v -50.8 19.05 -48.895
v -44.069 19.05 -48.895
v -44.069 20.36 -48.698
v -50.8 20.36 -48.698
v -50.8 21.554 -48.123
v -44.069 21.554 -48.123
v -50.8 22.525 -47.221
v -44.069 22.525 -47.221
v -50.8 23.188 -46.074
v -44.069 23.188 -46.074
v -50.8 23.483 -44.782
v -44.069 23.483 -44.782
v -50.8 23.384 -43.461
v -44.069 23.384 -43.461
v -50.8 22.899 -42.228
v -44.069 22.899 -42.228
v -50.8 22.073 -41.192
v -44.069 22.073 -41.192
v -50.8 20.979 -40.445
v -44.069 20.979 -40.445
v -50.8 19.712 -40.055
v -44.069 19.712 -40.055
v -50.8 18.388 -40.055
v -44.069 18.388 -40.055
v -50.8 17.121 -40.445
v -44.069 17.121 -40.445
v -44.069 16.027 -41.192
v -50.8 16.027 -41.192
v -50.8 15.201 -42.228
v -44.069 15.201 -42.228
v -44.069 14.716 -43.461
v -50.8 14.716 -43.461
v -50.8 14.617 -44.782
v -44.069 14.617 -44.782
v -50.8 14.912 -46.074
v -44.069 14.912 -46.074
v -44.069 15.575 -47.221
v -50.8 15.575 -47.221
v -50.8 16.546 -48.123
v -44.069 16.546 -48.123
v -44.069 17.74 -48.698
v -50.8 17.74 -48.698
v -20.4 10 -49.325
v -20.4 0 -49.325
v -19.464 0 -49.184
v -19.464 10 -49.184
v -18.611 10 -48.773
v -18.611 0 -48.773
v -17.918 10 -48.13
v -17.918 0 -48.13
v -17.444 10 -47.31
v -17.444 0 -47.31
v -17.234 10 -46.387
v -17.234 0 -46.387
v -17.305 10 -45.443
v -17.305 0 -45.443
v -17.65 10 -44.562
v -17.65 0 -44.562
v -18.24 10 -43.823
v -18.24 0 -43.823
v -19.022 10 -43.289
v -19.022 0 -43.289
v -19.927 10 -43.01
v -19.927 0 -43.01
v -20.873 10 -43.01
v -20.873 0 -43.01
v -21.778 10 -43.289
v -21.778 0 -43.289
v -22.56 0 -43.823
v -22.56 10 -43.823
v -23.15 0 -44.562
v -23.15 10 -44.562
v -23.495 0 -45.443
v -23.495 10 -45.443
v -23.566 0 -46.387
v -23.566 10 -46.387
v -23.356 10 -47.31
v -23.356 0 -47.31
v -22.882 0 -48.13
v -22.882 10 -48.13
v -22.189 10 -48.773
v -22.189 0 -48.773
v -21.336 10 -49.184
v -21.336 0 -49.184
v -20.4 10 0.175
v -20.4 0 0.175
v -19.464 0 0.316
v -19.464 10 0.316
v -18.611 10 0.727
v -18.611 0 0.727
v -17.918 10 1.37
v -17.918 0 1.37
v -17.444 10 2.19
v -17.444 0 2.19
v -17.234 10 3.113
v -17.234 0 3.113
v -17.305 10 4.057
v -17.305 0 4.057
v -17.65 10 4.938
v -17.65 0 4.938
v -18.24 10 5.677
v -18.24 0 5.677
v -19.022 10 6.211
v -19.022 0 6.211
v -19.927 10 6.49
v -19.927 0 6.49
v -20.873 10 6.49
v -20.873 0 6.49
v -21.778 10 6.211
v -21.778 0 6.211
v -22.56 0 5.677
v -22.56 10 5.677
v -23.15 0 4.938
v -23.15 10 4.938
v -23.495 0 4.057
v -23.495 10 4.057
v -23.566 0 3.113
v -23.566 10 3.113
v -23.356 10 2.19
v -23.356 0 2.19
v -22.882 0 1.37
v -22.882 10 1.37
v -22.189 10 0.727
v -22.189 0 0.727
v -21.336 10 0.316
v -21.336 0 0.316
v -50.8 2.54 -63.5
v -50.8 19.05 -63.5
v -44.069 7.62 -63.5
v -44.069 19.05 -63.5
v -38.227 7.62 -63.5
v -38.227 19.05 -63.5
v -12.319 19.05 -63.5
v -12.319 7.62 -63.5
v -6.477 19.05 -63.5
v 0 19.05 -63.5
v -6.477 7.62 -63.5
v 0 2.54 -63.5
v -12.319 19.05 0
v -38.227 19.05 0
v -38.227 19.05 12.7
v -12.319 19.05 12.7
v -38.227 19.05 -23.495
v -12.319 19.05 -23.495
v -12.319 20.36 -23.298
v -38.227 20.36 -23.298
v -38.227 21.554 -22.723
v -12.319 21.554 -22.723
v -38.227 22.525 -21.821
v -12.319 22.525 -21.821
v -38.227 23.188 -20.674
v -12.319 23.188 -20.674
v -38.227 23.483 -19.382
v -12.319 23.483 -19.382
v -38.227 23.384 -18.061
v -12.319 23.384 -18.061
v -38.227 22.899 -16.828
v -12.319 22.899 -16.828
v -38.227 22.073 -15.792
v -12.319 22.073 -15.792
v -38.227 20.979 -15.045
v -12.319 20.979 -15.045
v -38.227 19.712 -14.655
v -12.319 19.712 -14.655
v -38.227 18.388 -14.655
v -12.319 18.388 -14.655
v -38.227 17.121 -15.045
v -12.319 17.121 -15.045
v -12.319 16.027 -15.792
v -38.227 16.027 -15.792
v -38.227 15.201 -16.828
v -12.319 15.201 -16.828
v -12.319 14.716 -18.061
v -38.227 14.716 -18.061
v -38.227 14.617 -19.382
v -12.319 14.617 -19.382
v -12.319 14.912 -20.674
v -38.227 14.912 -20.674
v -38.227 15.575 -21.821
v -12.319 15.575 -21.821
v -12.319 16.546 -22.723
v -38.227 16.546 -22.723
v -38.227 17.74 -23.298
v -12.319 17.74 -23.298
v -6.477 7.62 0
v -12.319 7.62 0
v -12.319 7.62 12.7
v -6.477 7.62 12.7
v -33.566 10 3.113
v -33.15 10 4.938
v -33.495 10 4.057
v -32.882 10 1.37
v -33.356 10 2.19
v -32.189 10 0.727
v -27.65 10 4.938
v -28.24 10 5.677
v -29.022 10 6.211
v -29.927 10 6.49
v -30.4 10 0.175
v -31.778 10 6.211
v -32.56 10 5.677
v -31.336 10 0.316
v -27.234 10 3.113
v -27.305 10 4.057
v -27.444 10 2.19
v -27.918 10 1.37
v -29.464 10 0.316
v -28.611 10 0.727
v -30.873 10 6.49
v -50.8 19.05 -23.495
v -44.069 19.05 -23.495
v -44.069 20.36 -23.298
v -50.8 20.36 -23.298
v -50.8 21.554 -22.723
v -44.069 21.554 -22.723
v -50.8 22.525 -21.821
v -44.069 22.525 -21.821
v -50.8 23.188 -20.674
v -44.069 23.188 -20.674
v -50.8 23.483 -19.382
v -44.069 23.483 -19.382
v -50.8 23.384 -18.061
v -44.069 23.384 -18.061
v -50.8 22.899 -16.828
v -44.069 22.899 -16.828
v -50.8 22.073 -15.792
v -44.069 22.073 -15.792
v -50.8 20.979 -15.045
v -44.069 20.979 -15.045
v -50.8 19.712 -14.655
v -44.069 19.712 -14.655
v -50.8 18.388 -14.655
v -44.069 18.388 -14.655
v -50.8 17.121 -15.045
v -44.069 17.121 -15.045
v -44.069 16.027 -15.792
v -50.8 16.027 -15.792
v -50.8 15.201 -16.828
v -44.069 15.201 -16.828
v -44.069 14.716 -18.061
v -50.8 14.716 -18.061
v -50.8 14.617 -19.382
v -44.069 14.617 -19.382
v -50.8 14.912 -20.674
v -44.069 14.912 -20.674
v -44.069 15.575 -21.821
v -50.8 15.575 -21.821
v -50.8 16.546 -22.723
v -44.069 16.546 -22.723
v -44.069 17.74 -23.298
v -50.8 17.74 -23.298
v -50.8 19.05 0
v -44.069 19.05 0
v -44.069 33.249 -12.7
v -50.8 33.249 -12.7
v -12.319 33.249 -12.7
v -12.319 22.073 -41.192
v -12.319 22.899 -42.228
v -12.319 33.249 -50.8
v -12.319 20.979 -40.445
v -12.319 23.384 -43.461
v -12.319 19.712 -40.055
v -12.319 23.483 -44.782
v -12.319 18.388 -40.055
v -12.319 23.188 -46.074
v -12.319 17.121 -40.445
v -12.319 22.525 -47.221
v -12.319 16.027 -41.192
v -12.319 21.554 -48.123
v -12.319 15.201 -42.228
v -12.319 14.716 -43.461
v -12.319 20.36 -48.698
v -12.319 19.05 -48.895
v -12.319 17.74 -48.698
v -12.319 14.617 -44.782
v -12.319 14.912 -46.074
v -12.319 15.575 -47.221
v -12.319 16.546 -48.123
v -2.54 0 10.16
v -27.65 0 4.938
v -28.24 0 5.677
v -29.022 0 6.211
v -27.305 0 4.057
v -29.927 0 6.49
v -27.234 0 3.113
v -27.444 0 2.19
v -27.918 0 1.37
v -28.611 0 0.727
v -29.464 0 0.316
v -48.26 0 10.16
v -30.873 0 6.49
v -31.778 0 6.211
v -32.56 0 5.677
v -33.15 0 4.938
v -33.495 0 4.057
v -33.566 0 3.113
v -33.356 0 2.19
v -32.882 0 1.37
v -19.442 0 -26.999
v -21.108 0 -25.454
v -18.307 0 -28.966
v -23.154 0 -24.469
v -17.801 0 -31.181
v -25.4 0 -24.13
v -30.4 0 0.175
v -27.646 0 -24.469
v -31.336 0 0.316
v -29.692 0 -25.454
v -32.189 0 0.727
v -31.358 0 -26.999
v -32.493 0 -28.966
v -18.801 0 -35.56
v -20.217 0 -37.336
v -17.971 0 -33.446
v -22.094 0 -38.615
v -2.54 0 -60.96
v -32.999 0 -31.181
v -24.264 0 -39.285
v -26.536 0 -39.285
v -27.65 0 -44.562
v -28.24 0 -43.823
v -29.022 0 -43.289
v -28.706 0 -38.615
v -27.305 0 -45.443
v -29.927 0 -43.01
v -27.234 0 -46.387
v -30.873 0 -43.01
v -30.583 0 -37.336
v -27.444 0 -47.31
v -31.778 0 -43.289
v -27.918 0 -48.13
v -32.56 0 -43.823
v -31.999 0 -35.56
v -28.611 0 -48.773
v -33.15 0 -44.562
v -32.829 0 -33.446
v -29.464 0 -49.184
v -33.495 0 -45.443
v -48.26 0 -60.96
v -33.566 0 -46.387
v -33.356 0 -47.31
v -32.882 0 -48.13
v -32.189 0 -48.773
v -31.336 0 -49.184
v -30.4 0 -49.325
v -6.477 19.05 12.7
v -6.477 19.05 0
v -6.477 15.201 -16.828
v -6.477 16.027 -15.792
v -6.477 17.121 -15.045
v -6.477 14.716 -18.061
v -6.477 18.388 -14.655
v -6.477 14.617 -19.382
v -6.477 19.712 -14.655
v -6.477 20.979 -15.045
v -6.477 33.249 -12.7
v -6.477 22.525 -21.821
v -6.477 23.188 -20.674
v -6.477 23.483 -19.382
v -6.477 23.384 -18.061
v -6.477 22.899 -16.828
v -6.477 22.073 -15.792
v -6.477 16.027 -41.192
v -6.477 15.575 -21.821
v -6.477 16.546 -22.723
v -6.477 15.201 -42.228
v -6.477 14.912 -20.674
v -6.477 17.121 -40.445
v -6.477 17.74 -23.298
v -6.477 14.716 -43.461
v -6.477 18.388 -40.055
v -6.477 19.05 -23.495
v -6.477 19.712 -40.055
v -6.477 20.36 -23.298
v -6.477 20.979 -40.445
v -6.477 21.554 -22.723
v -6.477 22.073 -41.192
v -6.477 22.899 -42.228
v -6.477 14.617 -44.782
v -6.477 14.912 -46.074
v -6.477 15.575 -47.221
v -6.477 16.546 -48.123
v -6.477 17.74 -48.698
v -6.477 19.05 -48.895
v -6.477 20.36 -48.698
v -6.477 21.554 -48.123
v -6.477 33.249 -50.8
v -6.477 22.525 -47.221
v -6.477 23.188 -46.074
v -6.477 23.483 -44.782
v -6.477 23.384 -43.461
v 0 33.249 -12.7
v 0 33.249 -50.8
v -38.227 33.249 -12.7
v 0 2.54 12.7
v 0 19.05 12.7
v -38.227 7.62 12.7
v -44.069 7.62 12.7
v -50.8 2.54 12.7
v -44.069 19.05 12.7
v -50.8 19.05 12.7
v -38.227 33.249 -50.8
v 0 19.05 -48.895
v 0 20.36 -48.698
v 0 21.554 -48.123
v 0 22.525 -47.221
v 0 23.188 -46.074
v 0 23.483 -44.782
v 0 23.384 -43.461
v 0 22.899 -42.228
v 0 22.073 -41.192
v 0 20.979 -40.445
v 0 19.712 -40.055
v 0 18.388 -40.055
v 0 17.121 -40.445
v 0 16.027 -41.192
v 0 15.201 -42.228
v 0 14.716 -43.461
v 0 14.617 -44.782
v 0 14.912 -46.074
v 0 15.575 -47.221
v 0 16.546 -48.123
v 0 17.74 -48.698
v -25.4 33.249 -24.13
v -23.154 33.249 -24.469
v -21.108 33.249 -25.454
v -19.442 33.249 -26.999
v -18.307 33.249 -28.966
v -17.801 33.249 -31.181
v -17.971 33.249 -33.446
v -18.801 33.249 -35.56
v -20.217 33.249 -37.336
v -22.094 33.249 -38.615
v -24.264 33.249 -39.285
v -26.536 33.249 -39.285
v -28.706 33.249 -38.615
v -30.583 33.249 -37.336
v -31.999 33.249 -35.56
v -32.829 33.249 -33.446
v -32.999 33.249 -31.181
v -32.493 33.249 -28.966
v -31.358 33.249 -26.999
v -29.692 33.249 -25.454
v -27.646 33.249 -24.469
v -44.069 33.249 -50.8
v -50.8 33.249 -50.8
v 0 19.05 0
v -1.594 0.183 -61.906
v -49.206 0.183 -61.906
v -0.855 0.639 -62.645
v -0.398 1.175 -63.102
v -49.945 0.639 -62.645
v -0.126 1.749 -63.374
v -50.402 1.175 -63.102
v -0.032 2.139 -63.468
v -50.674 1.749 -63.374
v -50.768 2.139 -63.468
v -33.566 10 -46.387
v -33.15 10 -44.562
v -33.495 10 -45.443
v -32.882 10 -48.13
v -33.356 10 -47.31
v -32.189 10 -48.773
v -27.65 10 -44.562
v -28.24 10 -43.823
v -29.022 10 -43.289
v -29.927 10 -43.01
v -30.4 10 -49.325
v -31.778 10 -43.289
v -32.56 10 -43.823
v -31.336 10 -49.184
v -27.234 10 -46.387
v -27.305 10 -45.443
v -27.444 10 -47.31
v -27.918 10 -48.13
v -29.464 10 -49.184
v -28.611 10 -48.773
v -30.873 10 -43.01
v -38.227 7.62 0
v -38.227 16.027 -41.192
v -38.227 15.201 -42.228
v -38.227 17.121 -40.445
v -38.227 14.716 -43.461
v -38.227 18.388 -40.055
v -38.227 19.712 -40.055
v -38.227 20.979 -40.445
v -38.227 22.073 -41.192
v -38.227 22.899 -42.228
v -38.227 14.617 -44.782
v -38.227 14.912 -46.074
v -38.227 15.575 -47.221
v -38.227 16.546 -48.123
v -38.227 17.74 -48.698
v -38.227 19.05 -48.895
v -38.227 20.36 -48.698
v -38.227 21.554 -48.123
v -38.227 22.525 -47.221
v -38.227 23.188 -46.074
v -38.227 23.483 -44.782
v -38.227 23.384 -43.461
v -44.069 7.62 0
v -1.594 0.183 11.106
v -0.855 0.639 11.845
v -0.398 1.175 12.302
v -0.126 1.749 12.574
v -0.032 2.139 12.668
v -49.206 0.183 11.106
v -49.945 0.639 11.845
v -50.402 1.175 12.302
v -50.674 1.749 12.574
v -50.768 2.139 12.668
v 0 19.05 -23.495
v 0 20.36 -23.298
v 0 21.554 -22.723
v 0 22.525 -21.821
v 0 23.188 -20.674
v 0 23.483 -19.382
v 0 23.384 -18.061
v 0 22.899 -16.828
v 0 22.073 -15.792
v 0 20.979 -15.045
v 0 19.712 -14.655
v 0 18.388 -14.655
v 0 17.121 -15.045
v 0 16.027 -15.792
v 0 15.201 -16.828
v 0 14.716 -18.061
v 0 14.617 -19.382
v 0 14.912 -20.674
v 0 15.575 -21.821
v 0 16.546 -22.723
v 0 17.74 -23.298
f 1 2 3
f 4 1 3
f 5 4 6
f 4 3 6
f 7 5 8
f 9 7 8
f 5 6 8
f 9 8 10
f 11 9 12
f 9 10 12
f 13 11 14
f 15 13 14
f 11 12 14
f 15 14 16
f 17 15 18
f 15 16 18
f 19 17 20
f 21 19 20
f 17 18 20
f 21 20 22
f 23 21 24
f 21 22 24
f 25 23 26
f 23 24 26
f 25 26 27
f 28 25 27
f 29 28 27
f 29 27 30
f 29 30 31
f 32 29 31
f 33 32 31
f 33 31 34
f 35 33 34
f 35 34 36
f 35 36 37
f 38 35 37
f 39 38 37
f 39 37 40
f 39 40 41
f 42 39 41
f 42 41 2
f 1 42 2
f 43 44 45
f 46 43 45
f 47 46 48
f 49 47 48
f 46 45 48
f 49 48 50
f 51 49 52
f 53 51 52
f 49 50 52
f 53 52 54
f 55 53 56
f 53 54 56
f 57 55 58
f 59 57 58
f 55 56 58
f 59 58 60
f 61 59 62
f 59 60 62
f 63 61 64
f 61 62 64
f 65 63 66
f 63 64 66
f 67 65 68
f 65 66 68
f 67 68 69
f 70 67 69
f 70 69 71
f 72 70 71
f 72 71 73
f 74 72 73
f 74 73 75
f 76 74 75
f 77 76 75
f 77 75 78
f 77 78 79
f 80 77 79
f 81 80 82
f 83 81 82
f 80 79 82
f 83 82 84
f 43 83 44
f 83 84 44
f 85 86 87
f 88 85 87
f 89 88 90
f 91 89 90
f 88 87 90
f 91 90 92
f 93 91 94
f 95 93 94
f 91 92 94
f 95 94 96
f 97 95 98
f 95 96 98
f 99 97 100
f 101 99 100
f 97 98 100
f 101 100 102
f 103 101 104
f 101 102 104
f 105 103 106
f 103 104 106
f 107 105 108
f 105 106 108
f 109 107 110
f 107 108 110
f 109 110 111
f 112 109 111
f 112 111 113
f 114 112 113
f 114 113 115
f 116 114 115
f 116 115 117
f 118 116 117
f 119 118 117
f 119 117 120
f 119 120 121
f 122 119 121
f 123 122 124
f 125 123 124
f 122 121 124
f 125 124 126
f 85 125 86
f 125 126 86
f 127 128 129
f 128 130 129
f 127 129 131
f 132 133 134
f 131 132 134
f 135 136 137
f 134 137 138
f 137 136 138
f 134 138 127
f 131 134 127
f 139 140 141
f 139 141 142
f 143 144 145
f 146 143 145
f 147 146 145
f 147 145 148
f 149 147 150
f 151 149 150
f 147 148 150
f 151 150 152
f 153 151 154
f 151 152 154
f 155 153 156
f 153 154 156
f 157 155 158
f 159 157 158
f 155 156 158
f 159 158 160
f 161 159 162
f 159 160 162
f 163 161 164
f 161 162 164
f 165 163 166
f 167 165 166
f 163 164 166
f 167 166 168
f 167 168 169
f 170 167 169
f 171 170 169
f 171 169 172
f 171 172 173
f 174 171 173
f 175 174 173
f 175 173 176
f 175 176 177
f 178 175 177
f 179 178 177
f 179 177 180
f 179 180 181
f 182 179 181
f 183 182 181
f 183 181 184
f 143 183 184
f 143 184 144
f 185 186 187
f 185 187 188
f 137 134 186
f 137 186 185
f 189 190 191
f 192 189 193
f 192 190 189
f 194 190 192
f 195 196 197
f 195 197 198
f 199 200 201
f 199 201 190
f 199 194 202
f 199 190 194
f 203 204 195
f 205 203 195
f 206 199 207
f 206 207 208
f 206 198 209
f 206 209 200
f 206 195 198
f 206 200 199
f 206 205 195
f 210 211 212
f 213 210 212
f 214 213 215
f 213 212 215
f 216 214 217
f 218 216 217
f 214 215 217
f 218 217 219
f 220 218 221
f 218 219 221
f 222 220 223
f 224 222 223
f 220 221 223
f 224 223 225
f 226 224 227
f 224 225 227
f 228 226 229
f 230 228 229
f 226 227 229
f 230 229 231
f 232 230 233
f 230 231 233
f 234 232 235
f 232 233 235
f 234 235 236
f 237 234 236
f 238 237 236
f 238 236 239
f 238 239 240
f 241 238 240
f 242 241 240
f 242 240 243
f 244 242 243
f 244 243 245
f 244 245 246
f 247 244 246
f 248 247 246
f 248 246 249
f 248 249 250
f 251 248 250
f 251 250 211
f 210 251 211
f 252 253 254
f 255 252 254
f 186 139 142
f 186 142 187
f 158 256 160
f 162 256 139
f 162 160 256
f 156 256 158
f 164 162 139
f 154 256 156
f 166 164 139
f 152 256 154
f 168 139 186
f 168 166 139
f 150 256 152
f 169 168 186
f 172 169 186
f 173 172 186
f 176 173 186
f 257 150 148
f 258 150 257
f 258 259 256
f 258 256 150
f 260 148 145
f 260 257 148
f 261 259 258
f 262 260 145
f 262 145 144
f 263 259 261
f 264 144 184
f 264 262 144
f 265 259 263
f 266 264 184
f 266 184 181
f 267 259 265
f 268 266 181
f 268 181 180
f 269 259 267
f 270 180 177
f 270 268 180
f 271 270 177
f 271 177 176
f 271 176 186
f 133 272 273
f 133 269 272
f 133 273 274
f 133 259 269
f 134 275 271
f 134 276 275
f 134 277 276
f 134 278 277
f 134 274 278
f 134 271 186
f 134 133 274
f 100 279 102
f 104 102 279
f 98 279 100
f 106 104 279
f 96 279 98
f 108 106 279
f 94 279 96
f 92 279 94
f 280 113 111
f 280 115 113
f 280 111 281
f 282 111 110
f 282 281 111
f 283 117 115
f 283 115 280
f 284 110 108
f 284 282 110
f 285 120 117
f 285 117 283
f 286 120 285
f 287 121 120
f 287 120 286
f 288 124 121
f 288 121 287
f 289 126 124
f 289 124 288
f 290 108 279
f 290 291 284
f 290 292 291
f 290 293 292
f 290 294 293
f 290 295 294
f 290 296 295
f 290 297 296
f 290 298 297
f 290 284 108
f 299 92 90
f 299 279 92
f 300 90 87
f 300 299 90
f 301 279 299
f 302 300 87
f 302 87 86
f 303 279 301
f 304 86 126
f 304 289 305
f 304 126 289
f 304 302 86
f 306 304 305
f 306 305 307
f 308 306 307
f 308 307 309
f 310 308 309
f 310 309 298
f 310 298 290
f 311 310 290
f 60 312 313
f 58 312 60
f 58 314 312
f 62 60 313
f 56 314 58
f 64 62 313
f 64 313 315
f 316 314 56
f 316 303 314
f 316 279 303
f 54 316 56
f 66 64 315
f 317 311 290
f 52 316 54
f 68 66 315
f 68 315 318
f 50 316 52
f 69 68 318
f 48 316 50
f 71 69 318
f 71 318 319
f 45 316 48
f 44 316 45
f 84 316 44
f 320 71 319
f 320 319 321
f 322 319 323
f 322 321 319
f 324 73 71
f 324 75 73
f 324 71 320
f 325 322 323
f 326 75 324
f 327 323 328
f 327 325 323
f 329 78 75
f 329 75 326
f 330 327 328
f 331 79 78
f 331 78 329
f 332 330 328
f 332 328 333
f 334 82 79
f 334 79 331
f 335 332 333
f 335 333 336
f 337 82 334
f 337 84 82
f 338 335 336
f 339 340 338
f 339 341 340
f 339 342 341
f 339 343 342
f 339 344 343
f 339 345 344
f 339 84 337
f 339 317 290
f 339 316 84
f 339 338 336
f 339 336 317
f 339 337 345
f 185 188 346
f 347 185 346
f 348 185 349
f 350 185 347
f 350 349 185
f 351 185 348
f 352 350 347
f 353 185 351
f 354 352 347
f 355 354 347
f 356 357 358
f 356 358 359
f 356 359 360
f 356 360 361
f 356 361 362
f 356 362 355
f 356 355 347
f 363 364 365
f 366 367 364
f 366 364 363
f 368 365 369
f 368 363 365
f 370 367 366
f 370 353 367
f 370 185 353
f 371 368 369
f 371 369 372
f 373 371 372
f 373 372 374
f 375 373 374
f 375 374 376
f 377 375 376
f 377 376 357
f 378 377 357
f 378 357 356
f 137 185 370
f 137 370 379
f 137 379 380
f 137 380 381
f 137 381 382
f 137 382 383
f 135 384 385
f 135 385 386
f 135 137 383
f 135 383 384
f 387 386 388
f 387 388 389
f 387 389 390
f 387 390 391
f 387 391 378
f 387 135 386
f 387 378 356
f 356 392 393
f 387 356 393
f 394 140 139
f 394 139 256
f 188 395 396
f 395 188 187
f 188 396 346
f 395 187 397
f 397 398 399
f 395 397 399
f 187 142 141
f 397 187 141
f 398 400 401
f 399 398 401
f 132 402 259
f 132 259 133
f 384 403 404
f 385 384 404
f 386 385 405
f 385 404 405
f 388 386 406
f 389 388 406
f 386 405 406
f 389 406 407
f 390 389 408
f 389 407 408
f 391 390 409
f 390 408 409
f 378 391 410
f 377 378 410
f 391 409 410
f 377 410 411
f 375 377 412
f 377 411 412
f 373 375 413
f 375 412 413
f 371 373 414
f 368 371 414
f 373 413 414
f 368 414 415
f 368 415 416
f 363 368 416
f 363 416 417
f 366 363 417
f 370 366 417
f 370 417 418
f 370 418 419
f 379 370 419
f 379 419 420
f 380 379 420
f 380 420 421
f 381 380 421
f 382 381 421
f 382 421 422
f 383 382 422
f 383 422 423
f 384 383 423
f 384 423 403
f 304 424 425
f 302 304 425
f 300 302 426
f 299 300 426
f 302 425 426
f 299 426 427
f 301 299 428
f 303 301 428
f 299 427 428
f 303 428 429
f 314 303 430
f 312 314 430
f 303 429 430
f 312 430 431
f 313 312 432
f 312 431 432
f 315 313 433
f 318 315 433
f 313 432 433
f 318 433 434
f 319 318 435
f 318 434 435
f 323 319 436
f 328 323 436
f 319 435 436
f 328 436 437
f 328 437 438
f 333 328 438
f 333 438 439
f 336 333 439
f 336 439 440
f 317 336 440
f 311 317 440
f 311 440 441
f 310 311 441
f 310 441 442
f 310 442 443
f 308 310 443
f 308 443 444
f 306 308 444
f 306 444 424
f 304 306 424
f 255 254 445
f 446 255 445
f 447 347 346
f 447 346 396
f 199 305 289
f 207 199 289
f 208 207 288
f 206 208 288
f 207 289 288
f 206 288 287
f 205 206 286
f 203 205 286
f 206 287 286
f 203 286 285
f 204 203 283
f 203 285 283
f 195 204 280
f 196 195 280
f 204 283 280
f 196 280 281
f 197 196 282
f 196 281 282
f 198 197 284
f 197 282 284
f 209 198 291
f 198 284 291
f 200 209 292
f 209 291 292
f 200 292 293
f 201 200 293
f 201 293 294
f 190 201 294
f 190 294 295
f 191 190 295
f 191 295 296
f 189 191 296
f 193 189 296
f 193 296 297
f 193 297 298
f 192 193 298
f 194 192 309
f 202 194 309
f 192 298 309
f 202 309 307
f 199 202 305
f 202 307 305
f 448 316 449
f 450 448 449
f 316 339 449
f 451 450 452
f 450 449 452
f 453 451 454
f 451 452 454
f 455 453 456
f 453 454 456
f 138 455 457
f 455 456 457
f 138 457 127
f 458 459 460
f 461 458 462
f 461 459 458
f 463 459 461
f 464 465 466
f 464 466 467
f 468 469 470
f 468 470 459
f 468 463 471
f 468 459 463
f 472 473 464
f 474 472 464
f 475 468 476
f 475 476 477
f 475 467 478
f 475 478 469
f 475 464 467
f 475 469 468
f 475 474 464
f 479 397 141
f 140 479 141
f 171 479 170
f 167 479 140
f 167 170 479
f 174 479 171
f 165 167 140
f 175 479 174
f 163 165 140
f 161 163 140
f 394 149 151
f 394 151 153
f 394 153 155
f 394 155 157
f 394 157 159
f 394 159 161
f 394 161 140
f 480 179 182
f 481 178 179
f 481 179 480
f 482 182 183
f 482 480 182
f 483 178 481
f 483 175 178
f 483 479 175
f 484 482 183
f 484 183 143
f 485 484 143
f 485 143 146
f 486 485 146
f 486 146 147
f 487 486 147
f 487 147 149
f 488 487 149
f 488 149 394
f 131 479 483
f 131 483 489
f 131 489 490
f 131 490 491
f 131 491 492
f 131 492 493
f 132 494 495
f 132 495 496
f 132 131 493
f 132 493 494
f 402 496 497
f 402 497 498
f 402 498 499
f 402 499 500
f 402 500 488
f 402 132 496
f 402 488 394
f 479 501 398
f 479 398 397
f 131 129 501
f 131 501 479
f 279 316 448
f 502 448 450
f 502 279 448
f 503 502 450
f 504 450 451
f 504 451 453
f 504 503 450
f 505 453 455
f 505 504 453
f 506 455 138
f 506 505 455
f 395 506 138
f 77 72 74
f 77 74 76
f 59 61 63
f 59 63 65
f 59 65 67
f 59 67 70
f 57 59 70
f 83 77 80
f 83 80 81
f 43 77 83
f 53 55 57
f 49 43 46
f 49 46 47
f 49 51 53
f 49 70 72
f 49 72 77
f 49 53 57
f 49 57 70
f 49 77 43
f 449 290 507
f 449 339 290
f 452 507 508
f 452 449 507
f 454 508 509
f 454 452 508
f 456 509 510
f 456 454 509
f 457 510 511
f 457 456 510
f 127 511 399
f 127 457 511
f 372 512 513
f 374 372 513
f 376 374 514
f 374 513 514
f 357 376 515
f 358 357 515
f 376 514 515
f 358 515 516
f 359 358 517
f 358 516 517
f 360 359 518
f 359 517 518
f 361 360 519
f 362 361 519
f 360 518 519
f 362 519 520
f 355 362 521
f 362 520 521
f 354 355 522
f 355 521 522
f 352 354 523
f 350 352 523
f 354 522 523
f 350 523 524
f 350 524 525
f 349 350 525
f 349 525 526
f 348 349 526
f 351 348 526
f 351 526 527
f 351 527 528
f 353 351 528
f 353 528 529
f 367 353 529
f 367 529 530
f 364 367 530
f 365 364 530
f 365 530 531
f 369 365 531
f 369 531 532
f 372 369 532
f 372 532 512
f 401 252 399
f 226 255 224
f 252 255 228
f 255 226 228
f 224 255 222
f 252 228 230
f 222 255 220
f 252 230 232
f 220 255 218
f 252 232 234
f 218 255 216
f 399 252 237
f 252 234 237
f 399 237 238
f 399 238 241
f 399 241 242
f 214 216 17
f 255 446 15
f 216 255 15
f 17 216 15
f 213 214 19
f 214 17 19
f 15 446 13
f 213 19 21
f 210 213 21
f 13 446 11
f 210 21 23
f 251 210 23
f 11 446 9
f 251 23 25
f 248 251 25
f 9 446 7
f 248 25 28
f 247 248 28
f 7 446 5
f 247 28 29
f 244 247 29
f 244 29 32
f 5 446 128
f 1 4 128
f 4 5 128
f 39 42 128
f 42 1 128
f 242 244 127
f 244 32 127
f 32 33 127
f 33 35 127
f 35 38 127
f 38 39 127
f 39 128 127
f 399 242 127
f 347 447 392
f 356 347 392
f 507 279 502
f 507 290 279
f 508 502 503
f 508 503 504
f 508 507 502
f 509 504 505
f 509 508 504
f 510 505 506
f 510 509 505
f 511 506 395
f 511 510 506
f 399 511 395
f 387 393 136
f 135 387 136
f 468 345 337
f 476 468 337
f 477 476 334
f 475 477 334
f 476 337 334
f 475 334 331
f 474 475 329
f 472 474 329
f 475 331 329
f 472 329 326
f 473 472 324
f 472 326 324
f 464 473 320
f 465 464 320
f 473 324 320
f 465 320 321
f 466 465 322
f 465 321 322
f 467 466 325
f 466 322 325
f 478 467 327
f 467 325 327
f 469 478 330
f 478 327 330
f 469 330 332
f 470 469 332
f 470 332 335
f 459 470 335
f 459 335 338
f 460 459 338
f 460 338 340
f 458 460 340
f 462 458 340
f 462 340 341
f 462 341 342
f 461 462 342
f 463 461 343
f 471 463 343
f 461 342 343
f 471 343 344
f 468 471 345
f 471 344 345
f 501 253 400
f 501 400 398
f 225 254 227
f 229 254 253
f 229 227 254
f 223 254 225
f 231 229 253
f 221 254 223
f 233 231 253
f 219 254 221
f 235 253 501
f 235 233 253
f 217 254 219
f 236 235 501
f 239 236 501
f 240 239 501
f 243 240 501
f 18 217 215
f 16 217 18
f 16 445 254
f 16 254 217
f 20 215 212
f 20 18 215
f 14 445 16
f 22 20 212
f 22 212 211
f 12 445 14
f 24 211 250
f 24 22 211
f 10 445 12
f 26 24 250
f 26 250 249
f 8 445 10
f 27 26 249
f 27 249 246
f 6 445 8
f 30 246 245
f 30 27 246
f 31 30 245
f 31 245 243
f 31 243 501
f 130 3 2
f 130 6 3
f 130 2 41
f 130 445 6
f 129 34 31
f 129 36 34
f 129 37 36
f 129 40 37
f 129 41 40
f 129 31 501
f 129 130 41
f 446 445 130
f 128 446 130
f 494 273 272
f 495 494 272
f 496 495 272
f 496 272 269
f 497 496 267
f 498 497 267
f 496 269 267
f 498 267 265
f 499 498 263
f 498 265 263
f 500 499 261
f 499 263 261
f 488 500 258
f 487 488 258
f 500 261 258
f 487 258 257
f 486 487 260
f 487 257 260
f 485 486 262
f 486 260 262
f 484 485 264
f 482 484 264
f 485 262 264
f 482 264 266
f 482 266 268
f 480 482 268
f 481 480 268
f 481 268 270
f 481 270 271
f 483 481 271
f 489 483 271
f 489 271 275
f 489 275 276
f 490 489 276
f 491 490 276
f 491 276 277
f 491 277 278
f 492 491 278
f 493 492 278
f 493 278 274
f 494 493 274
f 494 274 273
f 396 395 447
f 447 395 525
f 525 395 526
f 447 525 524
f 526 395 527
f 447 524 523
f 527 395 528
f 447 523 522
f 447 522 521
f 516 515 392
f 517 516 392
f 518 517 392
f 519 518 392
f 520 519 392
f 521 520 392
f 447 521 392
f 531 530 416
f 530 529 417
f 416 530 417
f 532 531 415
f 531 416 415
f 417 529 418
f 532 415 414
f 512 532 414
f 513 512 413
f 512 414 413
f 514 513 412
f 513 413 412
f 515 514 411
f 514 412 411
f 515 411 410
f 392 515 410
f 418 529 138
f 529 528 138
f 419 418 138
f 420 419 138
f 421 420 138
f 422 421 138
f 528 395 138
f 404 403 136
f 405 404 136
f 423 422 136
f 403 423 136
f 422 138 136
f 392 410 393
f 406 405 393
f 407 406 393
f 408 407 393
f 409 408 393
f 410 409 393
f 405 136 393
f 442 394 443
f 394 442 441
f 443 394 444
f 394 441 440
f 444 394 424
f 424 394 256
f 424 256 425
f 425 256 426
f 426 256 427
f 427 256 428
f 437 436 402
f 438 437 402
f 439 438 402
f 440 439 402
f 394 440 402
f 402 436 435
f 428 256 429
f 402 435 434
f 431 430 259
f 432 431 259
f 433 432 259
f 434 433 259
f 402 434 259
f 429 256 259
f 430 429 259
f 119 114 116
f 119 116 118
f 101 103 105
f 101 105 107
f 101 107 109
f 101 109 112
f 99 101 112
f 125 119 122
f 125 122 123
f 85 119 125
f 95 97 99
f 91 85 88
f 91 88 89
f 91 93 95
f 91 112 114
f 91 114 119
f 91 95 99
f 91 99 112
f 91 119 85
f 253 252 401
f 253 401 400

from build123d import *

# Parameters (mm, degrees)
SKETCH1_W           = 63.5
SKETCH1_H           = 6.35
BOSS_EXTRUDE1_DEPTH = 50.8
BOSS_EXTRUDE2_DEPTH = 50.8
SKETCH10_W          = 5.842
SKETCH10_H          = 25.629031657
CUT_EXTRUDE1_DEPTH  = 88.854357354
LPATTERN3_COUNT     = 2
LPATTERN3_PITCH     = 31.75
SKETCH11_R          = 4.445
CUT_EXTRUDE2_DEPTH  = 88.854357354
BOSS_EXTRUDE3_DEPTH = 12.7
SKETCH23_R          = 7.62
CUT_EXTRUDE6_DEPTH  = 88.854357354
FILLET2_R           = 2.54
SKETCH24_R          = 3.175
CUT_EXTRUDE7_DEPTH  = 10


with BuildPart() as part:
    # Sketch1 → Boss-Extrude1 (new body)
    with BuildSketch(Plane(origin=(0, 0, 0), x_dir=(0, 0, -1), z_dir=(1, 0, 0))):
        with Locations((31.75, 3.175)):
            Rectangle(SKETCH1_W, SKETCH1_H)
    extrude(amount=-BOSS_EXTRUDE1_DEPTH)

    # Sketch2 → Boss-Extrude2 (add)
    with BuildSketch(Plane(origin=(0, 0, 0), x_dir=(0, 0, -1), z_dir=(1, 0, 0))):
        Polygon((0, 6.35), (0, 19.05), (12.7, 33.249031657), (50.8, 33.249031657), (63.5, 19.05), (63.5, 6.35), align=None)
    extrude(amount=-BOSS_EXTRUDE2_DEPTH)

    # Sketch10 → Cut-Extrude1 (cut, through all)
    with BuildSketch(Plane(origin=(0, 0, -63.5), x_dir=(-1, 0, 0), z_dir=(0, 0, -1))):
        with Locations((9.398, 20.434515829)):
            Rectangle(SKETCH10_W, SKETCH10_H)
    cut_extrude1 = extrude(amount=-CUT_EXTRUDE1_DEPTH, mode=Mode.SUBTRACT)

    # LPattern3: Cut-Extrude1 ×2
    with Locations(*[(-i * LPATTERN3_PITCH, 0, 0) for i in range(1, LPATTERN3_COUNT)]):
        add(cut_extrude1, mode=Mode.SUBTRACT)

    # Sketch11 → Cut-Extrude2 (cut, through all)
    with BuildSketch(Plane(origin=(0, 0, 0), x_dir=(0, 0, -1), z_dir=(1, 0, 0))):
        with Locations((19.05, 19.05)):
            Circle(SKETCH11_R)
        with Locations((44.45, 19.05)):
            Circle(SKETCH11_R)
    extrude(amount=-CUT_EXTRUDE2_DEPTH, mode=Mode.SUBTRACT)

    # Sketch22 → Boss-Extrude3 (add)
    with BuildSketch(Plane.XY):
        Polygon((0, 0), (-50.8, 0), (-50.8, 7.62), (-50.8, 19.05), (-44.069, 19.05), (-44.069, 7.62), (-38.227, 7.62), (-38.227, 19.05), (-12.319, 19.05), (-12.319, 7.62), (-6.477, 7.62), (-6.477, 19.05), (0, 19.05), (0, 7.62), align=None)
    extrude(amount=BOSS_EXTRUDE3_DEPTH)

    # Sketch23 → Cut-Extrude6 (cut, through all)
    with BuildSketch(Plane(origin=(0, 33.249031657, 0), x_dir=(1, 0, 0), z_dir=(0, 1, 0))):
        with Locations(Location((-25.4, 31.75, 0), (0, 0, 270))):
            Circle(SKETCH23_R)
    extrude(amount=-CUT_EXTRUDE6_DEPTH, mode=Mode.SUBTRACT)

    # Fillet2
    fillet2_edges = [part.edges().sort_by_distance(p)[0] for p in [
        (-25.4, 0, 12.7),
        (0, 0, -25.4),
        (-50.8, 0, -25.4),
        (-25.4, 0, -63.5),
    ]]
    fillet(fillet2_edges, radius=FILLET2_R)

    # Sketch24 → Cut-Extrude7 (cut)
    with BuildSketch(Plane.XZ):
        with Locations(Location((-30.4, -46.15, 0), (0, 0, 270))):
            Circle(SKETCH24_R)
        with Locations(Location((-20.4, -46.15, 0), (0, 0, 270))):
            Circle(SKETCH24_R)
        with Locations(Location((-20.4, 3.35, 0), (0, 0, 270))):
            Circle(SKETCH24_R)
        with Locations(Location((-30.4, 3.35, 0), (0, 0, 270))):
            Circle(SKETCH24_R)
    extrude(amount=-CUT_EXTRUDE7_DEPTH, mode=Mode.SUBTRACT)


solid = part.part
